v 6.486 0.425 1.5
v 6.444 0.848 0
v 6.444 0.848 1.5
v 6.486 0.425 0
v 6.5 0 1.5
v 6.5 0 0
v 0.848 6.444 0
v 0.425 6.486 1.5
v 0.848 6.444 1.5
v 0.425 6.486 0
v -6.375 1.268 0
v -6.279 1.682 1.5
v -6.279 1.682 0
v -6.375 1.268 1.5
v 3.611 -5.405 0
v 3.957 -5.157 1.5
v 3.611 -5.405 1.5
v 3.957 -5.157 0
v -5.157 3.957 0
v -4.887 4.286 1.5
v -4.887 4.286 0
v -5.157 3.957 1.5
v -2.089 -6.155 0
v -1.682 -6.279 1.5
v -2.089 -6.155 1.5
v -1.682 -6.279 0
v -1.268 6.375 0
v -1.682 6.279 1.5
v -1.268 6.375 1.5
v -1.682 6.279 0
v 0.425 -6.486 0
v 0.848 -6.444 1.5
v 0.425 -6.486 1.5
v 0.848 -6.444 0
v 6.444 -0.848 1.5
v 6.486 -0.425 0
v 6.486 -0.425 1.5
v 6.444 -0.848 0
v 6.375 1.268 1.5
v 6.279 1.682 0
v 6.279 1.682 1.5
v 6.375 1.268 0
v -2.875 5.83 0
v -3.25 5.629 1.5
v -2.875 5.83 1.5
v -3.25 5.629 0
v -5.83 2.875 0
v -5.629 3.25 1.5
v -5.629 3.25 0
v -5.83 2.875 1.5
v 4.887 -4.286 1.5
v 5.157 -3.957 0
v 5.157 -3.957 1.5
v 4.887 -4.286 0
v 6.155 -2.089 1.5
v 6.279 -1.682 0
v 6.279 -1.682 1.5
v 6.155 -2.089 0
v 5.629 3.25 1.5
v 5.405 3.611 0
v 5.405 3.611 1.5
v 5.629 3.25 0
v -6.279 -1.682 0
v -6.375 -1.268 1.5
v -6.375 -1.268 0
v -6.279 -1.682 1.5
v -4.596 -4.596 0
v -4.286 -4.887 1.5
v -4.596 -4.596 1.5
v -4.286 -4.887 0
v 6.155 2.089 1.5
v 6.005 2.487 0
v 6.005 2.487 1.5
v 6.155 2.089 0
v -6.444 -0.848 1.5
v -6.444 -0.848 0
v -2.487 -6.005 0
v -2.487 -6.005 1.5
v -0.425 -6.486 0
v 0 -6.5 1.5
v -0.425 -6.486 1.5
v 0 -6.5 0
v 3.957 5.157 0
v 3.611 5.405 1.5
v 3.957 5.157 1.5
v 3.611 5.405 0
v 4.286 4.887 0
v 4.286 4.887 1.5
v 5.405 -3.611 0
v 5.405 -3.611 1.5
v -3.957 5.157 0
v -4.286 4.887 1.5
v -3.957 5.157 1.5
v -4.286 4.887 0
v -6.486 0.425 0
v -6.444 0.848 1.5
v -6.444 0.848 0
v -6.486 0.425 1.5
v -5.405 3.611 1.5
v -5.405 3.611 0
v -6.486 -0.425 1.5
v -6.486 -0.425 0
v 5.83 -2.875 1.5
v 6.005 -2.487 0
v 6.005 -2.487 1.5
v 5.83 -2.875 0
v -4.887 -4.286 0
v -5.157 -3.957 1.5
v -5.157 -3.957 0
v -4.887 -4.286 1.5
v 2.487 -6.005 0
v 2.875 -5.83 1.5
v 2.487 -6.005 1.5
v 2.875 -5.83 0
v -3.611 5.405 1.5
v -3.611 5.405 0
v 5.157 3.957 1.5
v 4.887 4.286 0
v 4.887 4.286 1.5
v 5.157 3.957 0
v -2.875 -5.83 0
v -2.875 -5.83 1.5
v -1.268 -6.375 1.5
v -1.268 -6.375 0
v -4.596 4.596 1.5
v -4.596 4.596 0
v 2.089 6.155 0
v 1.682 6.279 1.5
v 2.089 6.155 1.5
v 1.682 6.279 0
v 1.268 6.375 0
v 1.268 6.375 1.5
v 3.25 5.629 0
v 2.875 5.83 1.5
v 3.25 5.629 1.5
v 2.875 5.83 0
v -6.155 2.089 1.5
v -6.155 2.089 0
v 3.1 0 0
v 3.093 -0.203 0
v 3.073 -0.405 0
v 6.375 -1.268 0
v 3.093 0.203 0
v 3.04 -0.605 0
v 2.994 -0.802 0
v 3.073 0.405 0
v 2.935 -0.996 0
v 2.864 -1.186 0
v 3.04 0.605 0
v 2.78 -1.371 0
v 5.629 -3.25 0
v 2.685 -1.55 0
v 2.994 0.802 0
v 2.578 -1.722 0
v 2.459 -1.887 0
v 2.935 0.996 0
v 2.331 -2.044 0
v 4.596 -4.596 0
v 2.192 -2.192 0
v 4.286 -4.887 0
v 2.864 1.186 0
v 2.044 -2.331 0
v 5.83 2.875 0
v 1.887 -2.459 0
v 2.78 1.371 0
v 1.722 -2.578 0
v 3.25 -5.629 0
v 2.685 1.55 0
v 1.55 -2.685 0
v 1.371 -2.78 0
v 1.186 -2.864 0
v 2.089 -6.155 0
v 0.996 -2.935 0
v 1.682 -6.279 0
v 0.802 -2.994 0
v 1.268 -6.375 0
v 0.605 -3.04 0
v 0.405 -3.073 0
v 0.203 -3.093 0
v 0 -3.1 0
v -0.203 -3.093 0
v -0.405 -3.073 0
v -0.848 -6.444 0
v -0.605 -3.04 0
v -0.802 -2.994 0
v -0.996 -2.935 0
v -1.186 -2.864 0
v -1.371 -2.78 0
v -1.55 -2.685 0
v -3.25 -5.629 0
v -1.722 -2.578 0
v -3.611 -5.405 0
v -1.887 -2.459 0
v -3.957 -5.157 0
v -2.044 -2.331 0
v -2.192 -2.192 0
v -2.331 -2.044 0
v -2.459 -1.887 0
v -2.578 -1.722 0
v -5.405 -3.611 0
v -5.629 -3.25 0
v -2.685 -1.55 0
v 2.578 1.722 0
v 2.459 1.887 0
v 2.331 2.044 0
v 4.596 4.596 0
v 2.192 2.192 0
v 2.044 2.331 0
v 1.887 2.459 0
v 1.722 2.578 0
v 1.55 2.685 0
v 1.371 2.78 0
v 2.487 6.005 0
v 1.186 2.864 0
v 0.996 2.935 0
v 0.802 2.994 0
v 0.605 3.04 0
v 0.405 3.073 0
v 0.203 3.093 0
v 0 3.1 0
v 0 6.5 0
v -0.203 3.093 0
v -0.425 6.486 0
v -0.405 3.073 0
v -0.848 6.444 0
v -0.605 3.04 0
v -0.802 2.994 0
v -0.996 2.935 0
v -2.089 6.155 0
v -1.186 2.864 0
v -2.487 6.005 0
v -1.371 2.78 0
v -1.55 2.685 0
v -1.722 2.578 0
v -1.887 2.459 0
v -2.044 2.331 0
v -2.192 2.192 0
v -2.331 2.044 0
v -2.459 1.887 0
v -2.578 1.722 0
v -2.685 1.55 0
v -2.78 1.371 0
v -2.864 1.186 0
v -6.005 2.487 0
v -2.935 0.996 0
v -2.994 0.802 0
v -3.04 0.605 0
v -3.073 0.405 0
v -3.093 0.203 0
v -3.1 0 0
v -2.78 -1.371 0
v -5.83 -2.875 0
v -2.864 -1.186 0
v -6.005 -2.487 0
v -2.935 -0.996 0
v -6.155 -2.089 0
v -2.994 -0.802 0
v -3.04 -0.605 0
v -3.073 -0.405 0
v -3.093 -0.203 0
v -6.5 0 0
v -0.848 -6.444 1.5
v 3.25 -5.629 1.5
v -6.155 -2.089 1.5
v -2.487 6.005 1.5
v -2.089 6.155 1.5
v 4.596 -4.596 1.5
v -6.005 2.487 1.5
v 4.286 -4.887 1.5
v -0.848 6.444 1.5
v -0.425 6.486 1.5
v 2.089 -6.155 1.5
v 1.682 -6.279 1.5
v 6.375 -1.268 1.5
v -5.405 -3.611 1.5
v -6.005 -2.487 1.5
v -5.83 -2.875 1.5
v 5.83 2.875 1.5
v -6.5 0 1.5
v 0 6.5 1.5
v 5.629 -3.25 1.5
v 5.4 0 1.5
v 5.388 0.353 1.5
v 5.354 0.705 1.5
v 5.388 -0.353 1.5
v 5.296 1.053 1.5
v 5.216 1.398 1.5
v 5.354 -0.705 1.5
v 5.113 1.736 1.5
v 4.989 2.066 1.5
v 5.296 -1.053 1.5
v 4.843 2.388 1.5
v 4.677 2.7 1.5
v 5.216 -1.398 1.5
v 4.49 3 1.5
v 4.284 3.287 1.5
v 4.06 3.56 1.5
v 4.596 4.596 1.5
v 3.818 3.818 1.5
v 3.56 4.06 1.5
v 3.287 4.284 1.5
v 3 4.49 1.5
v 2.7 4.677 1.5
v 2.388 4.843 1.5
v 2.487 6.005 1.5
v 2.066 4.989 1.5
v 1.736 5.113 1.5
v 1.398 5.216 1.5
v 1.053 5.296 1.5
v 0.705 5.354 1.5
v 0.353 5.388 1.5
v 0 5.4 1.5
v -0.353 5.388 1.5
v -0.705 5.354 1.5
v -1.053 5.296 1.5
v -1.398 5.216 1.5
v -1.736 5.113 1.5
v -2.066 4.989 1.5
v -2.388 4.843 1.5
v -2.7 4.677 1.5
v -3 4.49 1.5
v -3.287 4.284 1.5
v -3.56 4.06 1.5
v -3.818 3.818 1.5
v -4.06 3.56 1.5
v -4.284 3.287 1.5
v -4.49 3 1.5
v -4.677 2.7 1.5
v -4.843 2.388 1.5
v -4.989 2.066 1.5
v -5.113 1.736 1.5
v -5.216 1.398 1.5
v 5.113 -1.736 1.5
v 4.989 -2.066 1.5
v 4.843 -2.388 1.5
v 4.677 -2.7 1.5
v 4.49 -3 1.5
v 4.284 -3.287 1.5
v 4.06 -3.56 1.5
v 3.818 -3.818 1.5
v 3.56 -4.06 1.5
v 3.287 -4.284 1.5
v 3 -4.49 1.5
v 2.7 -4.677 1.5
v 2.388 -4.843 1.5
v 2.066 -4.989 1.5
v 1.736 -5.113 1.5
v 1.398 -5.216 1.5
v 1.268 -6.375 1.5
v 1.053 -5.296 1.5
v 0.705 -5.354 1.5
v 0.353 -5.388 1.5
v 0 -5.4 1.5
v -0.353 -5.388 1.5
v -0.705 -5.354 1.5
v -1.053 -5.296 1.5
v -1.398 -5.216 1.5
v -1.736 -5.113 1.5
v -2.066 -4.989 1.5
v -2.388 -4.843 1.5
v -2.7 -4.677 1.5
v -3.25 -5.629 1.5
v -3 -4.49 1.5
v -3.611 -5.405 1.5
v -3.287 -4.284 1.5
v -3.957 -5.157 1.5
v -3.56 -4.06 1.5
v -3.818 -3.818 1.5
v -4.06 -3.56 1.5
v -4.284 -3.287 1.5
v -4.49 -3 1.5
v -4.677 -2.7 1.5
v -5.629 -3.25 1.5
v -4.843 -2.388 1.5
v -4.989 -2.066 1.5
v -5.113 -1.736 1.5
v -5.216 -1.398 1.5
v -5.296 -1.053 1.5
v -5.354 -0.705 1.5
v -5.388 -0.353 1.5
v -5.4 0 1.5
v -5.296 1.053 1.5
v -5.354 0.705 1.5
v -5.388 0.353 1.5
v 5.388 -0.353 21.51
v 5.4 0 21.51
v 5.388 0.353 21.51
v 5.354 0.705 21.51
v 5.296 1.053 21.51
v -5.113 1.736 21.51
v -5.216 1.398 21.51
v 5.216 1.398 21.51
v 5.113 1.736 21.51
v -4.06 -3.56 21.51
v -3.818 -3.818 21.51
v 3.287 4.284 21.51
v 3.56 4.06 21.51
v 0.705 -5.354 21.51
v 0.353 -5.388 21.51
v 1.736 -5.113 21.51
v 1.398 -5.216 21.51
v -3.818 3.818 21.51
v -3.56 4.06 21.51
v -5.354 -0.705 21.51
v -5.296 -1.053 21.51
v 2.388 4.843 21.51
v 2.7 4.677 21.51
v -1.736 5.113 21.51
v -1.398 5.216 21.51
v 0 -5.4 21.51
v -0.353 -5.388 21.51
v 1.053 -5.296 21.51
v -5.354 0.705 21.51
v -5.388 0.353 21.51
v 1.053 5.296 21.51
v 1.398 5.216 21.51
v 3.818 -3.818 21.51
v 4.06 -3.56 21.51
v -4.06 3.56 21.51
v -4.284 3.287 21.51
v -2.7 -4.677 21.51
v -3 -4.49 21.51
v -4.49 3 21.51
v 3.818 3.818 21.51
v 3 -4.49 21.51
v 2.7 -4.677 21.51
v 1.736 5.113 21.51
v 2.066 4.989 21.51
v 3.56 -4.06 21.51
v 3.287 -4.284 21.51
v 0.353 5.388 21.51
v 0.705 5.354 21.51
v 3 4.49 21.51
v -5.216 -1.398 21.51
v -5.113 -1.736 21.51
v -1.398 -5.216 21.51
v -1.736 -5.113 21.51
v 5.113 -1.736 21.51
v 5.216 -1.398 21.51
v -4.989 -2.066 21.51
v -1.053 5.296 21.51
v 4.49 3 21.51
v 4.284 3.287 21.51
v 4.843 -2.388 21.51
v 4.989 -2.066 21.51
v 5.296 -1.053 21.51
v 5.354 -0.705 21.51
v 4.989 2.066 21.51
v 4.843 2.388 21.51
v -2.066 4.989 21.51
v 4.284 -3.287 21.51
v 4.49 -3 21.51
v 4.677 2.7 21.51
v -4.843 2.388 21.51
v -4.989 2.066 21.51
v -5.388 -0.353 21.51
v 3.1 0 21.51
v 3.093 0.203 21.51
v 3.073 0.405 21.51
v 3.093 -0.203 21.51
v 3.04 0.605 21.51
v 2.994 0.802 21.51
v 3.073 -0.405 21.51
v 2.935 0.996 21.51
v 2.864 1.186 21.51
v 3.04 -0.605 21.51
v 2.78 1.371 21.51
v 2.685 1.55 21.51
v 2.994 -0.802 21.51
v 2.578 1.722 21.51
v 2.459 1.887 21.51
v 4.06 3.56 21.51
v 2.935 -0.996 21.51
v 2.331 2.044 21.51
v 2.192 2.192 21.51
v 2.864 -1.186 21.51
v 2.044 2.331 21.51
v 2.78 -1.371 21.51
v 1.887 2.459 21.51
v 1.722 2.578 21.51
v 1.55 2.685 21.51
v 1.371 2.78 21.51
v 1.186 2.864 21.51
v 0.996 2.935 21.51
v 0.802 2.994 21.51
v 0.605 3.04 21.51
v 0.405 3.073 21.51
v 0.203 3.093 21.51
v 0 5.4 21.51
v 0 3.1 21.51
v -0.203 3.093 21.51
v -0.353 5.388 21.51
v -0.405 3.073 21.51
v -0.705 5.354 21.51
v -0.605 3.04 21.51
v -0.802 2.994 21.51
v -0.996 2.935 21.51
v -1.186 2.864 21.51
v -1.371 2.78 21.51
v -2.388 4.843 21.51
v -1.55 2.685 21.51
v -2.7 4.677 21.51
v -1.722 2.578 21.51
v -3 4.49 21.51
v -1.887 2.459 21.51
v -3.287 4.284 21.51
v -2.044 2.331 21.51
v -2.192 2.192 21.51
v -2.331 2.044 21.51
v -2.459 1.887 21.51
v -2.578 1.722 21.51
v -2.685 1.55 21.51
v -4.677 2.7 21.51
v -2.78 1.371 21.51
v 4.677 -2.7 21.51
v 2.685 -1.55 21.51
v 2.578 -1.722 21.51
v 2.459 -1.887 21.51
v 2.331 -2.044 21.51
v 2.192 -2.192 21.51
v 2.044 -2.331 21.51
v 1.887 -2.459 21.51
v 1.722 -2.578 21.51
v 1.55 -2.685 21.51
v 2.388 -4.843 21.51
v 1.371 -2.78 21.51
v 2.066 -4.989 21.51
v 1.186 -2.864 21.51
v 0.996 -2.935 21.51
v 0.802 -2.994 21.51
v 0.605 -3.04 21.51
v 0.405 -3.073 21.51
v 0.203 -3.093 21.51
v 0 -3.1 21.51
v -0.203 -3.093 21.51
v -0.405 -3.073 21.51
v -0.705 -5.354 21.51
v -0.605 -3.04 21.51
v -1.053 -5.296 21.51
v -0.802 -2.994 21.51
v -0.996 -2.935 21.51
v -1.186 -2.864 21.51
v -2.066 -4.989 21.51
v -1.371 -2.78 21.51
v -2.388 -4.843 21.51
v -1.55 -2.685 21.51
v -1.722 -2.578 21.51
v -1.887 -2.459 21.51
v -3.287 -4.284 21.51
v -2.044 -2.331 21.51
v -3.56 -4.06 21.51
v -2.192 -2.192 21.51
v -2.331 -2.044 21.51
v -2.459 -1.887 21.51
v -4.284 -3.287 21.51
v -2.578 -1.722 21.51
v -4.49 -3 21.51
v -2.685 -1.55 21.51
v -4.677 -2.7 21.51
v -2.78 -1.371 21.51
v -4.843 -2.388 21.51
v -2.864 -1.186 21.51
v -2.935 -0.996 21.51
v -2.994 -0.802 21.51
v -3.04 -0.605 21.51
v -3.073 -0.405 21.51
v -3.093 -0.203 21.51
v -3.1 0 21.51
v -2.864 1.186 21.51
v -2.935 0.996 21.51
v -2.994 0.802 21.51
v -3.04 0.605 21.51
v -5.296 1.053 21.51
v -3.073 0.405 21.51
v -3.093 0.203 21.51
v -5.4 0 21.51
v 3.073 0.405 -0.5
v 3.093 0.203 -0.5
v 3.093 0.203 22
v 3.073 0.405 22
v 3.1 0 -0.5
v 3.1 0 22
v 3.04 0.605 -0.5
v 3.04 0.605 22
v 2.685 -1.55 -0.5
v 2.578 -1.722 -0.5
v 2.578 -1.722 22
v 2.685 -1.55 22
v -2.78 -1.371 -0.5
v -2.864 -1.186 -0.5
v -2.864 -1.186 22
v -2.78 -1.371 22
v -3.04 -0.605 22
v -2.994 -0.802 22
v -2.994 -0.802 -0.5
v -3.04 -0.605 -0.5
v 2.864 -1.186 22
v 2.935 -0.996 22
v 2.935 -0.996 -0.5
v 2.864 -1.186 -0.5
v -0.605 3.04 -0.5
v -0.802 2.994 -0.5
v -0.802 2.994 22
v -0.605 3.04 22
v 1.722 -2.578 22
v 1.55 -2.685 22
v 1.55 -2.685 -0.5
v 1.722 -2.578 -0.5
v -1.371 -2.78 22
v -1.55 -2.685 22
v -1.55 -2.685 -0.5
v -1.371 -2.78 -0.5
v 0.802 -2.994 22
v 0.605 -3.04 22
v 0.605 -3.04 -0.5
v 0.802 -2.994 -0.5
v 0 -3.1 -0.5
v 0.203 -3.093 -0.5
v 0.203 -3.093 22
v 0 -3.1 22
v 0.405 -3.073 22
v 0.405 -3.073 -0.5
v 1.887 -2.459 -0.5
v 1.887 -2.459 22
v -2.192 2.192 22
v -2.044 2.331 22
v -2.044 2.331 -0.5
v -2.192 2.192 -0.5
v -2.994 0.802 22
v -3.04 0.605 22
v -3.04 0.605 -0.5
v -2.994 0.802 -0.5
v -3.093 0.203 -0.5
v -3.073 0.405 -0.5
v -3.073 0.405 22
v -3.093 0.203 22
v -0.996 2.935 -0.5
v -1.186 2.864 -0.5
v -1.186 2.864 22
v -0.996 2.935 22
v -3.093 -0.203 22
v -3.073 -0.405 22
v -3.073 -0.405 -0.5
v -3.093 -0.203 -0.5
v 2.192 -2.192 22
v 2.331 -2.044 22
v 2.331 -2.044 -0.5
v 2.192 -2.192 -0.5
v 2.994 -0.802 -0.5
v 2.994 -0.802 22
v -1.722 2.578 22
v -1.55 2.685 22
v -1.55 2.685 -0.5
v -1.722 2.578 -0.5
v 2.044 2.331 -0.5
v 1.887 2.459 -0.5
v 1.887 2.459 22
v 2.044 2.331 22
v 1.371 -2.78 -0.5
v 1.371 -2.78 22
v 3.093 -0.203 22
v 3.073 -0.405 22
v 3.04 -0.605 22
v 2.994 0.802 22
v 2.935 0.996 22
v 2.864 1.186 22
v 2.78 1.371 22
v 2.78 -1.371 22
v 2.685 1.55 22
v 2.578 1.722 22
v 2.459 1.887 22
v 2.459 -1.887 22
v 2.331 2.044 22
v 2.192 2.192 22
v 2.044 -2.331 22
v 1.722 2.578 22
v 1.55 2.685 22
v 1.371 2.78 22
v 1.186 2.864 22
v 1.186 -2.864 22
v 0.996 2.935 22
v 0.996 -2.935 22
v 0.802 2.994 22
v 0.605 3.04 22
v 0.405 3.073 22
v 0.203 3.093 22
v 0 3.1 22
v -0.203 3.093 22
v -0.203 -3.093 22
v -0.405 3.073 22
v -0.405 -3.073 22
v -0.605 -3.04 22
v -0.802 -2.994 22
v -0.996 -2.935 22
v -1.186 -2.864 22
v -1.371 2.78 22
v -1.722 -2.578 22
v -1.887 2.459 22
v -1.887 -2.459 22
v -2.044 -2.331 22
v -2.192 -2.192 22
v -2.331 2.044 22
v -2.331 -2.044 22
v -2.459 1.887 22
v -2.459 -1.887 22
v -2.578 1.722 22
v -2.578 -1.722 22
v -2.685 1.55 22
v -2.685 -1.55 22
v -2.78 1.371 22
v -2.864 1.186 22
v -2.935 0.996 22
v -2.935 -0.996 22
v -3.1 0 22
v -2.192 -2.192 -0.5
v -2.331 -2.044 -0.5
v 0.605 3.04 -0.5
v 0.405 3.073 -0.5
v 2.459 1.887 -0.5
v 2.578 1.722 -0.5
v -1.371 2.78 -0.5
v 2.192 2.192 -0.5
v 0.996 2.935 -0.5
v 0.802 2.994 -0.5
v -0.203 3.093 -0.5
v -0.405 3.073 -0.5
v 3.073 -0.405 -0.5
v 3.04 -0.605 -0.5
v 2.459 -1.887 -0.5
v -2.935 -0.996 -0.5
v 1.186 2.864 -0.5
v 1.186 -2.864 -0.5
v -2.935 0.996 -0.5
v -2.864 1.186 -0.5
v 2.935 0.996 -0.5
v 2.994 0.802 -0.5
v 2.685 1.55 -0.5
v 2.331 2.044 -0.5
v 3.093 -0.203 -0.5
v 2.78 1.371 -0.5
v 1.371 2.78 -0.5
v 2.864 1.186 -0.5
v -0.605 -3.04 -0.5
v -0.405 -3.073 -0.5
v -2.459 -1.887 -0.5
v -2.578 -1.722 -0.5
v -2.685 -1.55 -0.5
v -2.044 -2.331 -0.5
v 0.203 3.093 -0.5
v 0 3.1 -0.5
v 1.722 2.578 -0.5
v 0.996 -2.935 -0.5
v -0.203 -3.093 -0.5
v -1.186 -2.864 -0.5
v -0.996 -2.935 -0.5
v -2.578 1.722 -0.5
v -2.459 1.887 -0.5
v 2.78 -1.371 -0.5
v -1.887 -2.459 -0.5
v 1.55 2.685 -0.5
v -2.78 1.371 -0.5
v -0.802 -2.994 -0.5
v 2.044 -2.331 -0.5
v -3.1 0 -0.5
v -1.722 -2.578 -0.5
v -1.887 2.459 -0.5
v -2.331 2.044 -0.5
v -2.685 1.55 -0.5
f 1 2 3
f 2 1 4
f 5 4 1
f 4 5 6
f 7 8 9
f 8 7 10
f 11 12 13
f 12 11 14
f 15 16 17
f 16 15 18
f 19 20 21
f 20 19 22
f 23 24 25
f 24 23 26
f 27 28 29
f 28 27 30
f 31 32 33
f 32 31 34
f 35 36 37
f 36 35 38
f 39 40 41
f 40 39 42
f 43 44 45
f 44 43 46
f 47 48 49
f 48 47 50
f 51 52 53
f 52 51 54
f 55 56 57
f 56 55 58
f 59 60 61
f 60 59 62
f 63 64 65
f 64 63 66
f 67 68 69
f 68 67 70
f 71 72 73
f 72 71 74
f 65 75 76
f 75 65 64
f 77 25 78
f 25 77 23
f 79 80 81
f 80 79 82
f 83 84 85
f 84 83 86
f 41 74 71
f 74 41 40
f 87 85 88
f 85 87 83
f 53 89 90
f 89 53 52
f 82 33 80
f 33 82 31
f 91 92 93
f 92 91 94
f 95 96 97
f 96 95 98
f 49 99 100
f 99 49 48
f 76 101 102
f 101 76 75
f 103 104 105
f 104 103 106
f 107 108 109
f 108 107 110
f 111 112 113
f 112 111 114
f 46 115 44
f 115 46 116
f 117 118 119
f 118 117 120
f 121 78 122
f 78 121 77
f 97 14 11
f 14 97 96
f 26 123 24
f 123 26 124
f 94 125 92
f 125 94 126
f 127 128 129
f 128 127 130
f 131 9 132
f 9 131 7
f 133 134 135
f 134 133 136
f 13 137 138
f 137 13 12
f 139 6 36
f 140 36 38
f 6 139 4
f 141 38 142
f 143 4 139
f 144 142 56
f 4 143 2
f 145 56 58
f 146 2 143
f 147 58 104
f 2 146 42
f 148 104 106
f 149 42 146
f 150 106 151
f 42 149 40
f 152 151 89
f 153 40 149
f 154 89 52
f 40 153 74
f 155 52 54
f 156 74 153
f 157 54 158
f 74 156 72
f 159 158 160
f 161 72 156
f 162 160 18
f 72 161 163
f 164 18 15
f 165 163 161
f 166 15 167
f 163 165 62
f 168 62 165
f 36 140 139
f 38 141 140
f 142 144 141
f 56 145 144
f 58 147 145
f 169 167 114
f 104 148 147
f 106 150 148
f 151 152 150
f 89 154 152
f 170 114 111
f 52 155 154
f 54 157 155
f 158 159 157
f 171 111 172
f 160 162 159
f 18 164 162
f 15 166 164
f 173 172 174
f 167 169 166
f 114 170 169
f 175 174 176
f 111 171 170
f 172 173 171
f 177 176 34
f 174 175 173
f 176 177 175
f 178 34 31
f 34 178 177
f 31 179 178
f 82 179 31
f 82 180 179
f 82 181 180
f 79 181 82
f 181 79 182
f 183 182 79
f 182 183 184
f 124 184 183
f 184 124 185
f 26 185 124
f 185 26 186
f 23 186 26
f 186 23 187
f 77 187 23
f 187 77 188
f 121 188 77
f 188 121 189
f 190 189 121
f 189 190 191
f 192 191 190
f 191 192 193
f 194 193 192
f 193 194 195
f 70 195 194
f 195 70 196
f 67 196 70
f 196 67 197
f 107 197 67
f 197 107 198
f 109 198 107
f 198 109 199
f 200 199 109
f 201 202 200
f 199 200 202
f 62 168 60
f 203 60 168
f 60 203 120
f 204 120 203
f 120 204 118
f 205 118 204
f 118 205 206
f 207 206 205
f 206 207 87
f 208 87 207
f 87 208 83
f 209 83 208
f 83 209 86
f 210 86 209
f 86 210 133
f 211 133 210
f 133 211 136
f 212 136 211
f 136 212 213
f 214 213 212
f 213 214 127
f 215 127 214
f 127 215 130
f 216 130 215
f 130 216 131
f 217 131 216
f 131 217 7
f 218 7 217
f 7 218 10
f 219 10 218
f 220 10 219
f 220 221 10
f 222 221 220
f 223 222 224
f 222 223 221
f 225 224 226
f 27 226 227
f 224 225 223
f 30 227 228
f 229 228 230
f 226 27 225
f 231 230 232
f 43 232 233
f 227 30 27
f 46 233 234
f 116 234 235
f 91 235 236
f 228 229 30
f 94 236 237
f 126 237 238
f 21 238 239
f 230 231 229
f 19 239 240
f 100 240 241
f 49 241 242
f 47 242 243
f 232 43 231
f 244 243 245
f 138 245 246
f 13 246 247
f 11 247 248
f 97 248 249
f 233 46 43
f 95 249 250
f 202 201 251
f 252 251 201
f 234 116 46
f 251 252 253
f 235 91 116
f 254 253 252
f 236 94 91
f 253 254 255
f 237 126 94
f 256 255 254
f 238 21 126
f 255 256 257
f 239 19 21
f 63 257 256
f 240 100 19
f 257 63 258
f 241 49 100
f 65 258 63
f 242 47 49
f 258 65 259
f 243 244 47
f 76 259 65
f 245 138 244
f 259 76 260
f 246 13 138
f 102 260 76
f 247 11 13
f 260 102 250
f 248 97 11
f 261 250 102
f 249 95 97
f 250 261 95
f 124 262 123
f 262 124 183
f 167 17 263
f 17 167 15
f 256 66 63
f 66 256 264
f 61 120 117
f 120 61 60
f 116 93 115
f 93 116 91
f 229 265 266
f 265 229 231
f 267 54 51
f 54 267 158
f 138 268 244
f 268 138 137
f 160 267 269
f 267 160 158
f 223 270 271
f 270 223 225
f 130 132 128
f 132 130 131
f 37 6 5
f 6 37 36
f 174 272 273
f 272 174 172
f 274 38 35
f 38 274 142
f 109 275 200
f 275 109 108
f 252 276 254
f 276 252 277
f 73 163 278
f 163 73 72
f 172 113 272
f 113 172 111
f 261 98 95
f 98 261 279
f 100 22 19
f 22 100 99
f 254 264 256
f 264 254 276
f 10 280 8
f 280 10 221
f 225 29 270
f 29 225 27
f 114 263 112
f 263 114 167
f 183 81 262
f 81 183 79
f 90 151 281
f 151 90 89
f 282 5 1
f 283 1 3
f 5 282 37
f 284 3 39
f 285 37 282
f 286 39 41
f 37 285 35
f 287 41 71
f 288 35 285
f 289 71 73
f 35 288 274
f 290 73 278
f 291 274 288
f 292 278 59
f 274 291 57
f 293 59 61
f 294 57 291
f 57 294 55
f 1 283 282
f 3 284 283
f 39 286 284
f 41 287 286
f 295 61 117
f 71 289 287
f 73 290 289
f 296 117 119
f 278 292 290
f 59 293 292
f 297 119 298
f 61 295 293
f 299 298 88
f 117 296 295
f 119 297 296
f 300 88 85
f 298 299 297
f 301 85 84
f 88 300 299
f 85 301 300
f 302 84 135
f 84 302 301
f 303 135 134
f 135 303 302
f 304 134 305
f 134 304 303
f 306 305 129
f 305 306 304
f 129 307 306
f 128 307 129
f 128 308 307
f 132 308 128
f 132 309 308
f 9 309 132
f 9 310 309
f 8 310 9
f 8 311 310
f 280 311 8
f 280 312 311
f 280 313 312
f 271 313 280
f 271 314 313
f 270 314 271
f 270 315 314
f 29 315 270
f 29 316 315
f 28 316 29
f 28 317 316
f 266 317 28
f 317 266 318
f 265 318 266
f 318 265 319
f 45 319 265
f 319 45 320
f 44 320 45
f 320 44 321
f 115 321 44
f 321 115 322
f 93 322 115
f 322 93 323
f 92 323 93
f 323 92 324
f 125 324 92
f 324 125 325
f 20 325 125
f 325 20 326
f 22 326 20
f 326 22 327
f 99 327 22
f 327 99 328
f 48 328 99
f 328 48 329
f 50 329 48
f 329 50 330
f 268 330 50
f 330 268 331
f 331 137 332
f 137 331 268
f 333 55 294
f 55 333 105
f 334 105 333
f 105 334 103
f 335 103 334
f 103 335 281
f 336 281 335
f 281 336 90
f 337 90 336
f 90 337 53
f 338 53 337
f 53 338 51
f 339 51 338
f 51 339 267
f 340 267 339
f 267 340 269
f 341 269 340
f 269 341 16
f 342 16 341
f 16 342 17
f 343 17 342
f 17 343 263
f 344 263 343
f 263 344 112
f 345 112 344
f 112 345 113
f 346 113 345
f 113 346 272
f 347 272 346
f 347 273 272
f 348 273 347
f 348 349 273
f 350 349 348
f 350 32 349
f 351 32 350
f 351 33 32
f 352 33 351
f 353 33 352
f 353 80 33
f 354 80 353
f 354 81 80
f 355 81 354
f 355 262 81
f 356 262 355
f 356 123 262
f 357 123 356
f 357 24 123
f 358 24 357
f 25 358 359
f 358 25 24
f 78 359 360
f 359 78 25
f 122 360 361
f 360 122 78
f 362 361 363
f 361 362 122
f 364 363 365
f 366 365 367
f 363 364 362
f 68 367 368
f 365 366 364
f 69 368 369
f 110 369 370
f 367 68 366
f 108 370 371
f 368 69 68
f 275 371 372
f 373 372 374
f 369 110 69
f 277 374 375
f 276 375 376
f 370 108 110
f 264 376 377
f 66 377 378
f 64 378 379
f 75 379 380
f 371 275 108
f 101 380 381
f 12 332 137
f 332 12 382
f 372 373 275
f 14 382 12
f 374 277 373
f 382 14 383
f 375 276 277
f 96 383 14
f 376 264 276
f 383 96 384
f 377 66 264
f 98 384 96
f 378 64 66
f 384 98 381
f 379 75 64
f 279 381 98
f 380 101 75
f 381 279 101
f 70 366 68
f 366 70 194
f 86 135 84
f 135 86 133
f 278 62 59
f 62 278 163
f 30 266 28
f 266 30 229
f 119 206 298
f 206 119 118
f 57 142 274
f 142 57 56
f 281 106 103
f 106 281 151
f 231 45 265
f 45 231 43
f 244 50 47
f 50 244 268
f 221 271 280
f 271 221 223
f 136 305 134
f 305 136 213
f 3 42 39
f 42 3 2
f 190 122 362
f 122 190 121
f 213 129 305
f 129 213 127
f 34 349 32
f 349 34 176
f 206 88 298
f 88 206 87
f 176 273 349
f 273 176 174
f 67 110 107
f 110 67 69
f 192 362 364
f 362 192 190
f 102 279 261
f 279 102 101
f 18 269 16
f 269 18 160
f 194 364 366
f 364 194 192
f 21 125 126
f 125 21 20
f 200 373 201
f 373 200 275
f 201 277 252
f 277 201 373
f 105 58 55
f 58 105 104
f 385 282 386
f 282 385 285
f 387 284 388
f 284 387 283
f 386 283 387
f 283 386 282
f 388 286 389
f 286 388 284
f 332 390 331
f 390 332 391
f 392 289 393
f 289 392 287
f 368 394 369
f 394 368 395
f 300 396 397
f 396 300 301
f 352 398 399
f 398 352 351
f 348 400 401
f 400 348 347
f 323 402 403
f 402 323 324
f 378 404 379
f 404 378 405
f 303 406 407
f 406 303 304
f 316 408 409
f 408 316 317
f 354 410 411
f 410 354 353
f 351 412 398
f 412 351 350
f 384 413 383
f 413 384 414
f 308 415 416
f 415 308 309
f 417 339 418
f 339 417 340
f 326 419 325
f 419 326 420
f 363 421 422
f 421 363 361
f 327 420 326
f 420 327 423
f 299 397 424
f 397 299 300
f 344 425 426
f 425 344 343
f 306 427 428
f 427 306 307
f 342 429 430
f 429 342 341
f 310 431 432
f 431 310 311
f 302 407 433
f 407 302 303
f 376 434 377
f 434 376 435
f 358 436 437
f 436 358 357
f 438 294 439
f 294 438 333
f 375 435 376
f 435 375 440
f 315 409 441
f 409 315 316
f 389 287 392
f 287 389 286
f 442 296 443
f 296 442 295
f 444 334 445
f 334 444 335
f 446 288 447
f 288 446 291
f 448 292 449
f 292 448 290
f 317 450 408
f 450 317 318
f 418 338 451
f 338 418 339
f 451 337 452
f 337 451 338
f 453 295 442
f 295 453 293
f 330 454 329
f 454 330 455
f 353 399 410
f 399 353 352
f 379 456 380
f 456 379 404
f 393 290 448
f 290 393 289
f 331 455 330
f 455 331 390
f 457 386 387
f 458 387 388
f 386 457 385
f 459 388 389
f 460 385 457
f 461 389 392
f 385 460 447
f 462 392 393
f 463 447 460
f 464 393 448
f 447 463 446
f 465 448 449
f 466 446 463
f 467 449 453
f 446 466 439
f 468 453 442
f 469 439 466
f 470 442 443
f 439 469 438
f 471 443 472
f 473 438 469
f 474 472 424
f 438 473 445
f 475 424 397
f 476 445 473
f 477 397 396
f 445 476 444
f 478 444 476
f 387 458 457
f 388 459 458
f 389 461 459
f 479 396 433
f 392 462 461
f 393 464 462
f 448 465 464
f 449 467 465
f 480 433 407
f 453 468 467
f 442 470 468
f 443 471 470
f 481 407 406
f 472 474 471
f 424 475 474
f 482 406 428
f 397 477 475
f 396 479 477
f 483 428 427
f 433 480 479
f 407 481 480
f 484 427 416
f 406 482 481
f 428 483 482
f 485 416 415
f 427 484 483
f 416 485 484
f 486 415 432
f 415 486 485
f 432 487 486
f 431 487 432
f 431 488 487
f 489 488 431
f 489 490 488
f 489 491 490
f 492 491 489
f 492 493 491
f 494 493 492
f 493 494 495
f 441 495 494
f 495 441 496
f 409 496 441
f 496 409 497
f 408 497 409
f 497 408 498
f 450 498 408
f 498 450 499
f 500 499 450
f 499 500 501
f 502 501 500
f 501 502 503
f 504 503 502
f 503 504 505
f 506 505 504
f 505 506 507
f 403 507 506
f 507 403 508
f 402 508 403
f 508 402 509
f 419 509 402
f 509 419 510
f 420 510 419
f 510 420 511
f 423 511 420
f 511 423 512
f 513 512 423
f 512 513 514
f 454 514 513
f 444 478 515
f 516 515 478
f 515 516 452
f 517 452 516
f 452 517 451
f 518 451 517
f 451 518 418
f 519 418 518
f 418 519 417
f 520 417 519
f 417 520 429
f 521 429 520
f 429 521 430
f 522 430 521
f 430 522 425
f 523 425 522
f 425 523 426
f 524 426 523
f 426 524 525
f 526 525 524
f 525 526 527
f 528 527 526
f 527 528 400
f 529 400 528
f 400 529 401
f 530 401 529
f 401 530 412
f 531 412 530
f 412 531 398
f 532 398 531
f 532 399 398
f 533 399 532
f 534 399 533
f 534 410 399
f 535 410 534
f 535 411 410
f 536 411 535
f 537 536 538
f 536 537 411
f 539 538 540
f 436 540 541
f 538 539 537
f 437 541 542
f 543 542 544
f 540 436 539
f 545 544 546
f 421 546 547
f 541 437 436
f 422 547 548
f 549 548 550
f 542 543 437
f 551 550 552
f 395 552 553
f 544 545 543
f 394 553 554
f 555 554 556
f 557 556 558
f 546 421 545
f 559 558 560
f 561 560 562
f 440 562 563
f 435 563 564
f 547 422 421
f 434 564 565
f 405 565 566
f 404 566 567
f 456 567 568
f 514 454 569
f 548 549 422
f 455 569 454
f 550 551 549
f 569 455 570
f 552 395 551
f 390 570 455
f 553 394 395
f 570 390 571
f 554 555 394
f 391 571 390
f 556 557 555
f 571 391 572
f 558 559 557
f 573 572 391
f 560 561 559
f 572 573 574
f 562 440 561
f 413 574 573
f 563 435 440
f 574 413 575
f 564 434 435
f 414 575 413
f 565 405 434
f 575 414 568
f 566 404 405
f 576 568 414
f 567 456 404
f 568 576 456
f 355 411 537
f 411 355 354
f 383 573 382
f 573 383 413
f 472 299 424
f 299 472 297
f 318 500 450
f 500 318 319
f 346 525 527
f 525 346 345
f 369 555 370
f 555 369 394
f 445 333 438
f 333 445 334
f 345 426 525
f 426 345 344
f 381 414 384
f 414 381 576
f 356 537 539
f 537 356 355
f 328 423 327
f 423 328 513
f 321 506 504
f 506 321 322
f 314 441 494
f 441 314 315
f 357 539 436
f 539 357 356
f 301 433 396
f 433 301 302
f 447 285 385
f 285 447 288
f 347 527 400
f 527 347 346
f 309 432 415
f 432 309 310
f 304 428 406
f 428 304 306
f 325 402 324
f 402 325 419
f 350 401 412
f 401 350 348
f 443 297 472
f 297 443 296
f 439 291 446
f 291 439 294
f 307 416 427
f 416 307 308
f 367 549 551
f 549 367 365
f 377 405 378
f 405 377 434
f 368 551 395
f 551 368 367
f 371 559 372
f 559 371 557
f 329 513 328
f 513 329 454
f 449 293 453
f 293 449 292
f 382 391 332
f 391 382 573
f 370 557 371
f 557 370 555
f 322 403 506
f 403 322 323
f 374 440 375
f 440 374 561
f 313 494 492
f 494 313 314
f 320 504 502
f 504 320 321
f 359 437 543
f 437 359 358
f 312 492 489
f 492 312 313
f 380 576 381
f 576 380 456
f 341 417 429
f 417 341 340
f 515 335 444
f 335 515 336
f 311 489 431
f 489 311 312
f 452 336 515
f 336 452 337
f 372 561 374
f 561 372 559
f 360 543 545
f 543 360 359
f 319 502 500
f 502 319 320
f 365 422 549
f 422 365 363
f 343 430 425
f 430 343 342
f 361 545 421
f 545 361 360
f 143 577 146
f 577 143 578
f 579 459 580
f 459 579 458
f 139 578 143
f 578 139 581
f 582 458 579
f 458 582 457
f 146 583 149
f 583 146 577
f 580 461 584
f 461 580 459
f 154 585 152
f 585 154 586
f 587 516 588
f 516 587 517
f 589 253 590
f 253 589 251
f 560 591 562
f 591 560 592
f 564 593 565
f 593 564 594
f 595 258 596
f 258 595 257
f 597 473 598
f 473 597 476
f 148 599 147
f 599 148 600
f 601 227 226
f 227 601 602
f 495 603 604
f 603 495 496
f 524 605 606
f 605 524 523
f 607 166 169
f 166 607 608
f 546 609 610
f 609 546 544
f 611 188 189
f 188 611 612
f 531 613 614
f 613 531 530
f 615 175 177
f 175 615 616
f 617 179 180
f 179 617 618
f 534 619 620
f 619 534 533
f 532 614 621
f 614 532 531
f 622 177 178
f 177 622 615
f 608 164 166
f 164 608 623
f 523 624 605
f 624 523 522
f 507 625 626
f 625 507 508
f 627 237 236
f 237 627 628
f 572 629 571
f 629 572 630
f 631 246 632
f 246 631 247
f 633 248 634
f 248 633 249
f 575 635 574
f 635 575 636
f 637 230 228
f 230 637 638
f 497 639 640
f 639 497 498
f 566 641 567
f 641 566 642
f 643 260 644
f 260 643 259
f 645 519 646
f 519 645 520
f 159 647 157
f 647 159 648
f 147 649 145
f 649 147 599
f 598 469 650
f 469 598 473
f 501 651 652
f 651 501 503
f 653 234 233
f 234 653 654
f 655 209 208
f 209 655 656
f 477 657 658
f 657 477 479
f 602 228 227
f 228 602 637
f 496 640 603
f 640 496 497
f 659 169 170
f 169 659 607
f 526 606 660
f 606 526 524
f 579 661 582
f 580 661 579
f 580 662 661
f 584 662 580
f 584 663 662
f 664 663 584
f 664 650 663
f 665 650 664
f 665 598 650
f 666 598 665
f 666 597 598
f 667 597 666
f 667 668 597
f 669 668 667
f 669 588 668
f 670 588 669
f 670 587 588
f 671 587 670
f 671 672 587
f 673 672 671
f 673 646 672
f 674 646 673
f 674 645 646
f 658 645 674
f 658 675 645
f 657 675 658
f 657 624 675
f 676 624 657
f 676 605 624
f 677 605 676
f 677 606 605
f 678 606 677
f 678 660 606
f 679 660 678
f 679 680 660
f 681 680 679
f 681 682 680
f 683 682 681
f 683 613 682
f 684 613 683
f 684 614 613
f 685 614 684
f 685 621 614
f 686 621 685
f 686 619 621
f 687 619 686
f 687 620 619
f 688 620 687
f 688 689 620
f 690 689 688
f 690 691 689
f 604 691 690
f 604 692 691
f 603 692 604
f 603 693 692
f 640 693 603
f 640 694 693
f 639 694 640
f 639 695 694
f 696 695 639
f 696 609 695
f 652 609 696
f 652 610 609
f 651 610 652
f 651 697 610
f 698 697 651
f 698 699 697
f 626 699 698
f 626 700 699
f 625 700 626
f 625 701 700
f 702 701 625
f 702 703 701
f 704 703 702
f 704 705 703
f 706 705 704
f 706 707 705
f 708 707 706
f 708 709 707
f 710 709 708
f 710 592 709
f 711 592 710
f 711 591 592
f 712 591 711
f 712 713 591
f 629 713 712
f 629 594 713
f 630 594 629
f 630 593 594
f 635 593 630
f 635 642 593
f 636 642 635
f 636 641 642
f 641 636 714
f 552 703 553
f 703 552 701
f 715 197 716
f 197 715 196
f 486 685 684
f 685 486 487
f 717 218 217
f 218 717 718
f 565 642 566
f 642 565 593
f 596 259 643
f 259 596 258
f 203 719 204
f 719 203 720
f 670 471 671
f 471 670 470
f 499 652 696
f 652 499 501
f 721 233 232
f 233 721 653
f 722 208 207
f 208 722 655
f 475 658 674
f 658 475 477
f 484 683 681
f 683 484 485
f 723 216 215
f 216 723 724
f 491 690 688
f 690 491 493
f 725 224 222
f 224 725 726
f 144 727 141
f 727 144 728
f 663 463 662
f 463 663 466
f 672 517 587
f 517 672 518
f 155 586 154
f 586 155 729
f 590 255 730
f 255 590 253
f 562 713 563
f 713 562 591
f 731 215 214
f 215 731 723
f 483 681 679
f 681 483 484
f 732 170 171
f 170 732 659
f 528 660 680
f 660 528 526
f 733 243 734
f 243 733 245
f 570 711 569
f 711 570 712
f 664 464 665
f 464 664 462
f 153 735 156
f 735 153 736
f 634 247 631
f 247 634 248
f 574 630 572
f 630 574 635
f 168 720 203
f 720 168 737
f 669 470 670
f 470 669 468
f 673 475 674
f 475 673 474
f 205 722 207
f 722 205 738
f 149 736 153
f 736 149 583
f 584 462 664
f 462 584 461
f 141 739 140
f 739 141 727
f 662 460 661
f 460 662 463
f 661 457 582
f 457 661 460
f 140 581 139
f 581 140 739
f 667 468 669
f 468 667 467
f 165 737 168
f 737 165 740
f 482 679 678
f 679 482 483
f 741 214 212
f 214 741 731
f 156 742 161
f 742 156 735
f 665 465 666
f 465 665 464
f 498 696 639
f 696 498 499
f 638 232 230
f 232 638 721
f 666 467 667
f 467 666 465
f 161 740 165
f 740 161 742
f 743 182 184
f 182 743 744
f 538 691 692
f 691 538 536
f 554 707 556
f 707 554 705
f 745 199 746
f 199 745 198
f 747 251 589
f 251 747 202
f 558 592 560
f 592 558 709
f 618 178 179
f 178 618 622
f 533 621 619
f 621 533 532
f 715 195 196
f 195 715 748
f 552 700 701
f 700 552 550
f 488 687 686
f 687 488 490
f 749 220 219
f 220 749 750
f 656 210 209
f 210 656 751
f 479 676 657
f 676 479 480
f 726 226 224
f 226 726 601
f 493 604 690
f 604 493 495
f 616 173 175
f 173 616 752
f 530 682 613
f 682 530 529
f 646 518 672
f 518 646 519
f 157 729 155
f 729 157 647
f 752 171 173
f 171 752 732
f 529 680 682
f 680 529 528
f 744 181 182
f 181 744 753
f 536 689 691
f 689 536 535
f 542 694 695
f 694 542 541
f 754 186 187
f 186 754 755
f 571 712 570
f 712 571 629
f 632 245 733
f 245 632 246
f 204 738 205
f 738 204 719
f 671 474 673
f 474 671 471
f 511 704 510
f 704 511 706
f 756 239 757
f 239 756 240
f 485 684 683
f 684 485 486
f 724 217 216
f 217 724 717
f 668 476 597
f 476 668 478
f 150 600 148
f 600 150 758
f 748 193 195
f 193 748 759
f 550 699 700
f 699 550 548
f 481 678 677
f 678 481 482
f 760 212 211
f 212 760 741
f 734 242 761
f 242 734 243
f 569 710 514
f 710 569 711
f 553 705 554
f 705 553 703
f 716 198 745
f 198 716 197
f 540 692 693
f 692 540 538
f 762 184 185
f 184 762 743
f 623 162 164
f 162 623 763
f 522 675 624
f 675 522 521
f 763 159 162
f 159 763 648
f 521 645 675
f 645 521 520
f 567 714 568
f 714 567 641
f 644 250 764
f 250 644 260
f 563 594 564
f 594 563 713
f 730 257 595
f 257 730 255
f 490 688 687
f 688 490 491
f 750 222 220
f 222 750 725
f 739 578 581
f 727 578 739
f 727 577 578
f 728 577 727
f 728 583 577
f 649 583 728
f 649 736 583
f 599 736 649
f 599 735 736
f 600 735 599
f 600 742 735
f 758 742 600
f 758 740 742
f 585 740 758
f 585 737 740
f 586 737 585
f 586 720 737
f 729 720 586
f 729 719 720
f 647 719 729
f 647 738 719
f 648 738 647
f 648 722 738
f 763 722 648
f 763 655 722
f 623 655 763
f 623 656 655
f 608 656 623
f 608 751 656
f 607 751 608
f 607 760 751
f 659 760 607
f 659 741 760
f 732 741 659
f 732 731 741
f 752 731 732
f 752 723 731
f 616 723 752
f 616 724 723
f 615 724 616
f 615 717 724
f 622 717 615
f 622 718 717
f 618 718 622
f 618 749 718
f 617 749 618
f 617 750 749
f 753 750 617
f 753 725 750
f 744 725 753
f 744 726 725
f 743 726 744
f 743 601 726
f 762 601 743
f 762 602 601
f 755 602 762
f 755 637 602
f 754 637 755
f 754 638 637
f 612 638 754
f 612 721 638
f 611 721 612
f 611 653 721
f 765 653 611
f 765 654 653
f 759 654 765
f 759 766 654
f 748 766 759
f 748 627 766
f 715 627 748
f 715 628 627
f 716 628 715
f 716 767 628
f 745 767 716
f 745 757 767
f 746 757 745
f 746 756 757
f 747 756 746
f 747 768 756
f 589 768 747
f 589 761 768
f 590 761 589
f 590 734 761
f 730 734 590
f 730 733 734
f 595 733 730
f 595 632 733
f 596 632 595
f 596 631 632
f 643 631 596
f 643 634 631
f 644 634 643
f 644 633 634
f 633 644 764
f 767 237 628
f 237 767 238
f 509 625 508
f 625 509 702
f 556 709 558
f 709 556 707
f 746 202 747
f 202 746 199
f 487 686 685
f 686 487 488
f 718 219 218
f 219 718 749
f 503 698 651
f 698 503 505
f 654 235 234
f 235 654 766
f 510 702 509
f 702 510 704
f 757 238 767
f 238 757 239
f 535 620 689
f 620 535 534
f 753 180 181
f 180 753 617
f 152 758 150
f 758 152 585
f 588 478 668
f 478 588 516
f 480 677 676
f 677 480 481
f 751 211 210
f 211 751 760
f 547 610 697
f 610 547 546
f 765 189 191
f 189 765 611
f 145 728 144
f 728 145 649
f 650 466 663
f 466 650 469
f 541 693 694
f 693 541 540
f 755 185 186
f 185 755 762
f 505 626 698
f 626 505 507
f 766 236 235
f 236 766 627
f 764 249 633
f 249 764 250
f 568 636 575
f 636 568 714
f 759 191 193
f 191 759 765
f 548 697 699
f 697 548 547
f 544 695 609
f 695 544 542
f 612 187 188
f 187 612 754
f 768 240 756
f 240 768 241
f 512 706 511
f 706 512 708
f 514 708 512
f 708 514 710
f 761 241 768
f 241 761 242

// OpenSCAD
// Adapter sleeve: 0.2 mL PCR tube for 1.5 mL tube rack
// Print orientation: collar on bed (z = 0), sleeve body builds upward

// ---- Dimensions (mm) ----
collar_d        = 13;     // collar outer diameter
collar_t        = 1.5;    // collar thickness (z = 0 to 1.5)
sleeve_d        = 10.8;   // sleeve body outer diameter
sleeve_h        = 20;     // sleeve body height (z = 1.5 to 21.5)
bore_d          = 6.2;    // through-bore diameter
eps             = 0.5;    // cutter overshoot past faces

$fn = 96;

// ---- Model ----
union() {
    // Collar
    cylinder(d = collar_d, h = collar_t);
    // Sleeve body (slightly overlapping the collar for a clean union)
    translate([0, 0, collar_t - 0.01])
        cylinder(d = sleeve_d, h = sleeve_h + 0.02);
    // Through bore
    translate([0, 0, -eps])
        cylinder(d = bore_d, h = sleeve_h + collar_t + 2 * eps);
}
